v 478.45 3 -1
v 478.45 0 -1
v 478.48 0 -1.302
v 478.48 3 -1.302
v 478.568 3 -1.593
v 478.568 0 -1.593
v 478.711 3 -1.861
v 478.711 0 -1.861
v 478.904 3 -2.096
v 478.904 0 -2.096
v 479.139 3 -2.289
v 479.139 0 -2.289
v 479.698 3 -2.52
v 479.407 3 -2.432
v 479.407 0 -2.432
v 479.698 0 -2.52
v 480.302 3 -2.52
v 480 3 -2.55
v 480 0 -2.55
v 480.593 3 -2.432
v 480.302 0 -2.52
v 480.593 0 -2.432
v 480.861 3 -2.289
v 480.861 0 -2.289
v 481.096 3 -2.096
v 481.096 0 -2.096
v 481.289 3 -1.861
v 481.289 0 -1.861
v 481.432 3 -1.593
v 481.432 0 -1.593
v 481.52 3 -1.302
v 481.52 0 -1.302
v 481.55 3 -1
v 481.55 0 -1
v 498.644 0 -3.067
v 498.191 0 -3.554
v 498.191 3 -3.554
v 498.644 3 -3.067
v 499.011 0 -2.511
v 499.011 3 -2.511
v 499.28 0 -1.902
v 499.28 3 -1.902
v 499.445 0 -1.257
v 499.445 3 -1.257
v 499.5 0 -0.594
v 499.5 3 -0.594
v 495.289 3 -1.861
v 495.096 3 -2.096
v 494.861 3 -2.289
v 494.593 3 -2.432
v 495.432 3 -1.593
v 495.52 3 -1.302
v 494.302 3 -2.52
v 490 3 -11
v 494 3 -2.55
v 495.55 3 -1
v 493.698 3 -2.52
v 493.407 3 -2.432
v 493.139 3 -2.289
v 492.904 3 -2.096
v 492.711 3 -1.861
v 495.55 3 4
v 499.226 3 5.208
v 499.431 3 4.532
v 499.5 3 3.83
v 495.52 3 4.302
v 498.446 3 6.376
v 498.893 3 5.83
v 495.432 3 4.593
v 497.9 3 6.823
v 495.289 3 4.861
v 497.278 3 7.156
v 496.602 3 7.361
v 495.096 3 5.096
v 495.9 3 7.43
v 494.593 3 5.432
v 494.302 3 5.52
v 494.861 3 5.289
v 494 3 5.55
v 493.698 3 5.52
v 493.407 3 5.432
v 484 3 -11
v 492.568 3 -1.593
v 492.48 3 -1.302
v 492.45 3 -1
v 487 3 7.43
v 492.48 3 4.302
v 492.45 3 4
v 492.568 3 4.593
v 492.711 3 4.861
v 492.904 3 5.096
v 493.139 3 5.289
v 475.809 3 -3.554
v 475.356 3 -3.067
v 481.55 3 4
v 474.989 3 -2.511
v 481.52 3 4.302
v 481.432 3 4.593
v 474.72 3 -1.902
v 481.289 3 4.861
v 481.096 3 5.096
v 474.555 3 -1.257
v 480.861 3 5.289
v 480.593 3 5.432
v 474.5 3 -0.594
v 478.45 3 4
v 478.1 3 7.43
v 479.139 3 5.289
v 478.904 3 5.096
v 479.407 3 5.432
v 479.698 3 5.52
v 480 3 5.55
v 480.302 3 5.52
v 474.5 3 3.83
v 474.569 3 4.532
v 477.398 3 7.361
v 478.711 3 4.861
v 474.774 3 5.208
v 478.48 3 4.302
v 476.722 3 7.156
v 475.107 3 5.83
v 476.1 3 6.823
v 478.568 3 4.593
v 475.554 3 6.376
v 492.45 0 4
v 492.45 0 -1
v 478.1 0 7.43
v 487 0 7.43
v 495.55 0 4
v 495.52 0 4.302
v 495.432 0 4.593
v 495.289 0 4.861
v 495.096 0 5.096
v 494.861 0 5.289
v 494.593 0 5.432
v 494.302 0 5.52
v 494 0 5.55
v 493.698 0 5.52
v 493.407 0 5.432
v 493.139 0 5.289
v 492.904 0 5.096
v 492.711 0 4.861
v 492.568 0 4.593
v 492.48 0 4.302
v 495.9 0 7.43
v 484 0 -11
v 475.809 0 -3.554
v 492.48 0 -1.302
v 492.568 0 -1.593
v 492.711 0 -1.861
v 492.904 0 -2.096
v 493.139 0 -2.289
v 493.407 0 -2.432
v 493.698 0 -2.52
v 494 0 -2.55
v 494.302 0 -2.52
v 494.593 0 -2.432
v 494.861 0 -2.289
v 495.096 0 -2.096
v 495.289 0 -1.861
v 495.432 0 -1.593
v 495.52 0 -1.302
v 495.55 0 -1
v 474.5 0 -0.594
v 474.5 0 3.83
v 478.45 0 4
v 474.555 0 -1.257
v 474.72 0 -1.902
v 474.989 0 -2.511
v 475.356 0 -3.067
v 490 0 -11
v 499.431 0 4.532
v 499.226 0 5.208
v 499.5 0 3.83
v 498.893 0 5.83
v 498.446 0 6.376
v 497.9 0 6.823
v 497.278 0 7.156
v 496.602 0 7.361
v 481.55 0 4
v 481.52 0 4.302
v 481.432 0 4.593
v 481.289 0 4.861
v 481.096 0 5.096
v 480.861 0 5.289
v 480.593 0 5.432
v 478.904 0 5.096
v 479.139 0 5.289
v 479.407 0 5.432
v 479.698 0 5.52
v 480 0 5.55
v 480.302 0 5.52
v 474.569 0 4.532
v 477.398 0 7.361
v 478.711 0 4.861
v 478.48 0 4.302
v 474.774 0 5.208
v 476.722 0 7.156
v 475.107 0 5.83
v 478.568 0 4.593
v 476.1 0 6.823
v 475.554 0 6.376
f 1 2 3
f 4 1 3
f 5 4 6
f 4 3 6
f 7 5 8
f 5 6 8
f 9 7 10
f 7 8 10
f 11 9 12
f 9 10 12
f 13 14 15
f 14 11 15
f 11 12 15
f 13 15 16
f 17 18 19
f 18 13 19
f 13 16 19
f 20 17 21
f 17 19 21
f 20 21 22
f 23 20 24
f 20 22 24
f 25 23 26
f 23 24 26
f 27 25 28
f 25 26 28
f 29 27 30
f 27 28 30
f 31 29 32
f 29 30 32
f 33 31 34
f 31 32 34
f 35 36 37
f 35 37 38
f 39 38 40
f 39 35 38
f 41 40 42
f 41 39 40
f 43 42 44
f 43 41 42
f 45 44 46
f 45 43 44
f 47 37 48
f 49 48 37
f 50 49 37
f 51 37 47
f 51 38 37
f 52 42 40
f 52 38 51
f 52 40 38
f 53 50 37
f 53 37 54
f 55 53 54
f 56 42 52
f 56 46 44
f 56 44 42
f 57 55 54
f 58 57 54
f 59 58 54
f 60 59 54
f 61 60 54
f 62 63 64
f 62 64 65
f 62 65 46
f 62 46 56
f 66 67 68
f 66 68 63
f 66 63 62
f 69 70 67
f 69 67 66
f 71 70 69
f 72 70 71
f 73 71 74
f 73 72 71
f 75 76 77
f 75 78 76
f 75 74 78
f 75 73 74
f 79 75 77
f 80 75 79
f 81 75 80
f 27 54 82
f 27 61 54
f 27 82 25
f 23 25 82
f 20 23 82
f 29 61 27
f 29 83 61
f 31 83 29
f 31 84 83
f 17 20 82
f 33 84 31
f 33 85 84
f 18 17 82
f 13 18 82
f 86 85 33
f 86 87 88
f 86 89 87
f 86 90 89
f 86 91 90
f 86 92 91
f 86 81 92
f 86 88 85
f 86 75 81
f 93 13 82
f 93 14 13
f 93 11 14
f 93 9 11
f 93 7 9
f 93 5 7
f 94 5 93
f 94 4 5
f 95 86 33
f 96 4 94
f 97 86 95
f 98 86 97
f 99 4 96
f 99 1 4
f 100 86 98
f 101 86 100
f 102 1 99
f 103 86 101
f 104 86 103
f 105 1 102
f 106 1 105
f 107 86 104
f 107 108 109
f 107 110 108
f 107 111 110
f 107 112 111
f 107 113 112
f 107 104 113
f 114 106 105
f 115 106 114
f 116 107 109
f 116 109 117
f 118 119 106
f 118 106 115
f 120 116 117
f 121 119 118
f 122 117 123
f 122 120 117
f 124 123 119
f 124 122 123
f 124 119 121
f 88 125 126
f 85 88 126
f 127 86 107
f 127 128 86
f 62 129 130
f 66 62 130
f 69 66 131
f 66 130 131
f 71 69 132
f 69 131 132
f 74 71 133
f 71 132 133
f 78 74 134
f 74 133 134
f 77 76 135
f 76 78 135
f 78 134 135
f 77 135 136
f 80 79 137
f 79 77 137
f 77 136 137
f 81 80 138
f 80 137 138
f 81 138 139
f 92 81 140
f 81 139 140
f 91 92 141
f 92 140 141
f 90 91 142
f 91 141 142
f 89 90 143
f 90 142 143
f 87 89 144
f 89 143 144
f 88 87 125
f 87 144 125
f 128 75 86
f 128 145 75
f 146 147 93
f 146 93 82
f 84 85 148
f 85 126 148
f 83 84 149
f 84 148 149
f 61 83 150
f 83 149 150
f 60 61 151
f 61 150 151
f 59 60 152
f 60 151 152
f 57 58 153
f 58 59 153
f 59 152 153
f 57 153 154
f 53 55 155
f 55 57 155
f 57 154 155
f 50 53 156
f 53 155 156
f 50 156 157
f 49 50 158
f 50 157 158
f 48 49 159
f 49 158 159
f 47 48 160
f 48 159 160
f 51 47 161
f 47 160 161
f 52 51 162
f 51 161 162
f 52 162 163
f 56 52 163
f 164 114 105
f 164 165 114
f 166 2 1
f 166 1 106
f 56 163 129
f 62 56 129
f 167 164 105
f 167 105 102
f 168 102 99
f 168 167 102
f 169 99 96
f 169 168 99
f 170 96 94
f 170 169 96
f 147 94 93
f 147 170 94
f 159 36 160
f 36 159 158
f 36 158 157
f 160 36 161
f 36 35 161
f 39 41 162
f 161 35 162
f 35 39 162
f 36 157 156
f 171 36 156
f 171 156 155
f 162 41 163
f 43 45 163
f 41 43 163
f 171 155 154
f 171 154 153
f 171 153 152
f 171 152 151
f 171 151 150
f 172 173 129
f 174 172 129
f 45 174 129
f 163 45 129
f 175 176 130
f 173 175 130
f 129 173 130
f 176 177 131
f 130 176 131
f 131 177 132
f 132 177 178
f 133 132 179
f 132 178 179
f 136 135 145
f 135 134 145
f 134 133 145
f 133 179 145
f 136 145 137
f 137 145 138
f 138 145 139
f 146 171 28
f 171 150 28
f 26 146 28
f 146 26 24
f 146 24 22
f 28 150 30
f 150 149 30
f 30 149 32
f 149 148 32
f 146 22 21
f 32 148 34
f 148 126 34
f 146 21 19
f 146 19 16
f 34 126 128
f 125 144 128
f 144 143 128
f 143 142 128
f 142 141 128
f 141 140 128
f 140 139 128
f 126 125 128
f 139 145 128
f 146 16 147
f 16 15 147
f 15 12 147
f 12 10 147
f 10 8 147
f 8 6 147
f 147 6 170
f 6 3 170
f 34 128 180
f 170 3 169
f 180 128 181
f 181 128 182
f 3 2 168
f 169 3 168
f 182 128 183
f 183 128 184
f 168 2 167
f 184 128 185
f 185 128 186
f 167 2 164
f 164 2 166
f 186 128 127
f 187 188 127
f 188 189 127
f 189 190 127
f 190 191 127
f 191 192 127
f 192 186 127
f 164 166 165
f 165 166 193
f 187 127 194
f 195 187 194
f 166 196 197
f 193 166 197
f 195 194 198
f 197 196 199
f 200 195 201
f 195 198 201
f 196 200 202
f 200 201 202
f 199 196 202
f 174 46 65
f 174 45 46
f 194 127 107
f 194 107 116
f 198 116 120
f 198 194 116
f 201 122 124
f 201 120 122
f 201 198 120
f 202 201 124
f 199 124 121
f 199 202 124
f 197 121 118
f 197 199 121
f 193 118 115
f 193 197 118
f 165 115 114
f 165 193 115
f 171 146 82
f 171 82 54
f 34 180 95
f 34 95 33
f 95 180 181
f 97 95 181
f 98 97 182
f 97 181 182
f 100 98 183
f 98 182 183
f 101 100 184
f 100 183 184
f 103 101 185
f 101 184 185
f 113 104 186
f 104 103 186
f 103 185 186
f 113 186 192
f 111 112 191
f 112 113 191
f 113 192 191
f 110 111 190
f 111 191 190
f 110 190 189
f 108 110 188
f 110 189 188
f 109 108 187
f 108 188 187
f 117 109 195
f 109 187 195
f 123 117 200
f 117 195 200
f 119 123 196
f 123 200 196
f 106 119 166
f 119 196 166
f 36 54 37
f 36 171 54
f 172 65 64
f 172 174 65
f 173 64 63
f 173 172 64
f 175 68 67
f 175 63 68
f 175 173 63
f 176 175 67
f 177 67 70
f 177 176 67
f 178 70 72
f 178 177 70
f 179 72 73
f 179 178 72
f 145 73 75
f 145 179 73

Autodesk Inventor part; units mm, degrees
ref_plane "YZ Plane" through (0, 0, 0) normal (1, 0, 0) x (0, 1, 0)
ref_plane "XZ Plane" through (0, 0, 0) normal (0, 1, 0) x (-1, 0, 0)
ref_plane "XY Plane" through (0, 0, 0) normal (0, 0, 1) x (1, 0, 0)
sketch3d "3D Sketch1"
sketch "Sketch8" plane through (0, 0, 0) normal (0, 1, 0) x (-1, 0, 0)
  arc A0 (-533.9727, 129.2939) -> (-533.9727, 72.7061) centre (-524, 101) ccw projected
  arc A1 (-533.9727, 129.2939) -> (-540.6211, 148.1565) centre (-537.2969, 138.7252) ccw projected
  arc A2 (-540.6211, 148.1565) -> (-540.6211, 53.8435) centre (-524, 101) ccw projected
  arc A3 (-540.6211, 53.8435) -> (-533.9727, 72.7061) centre (-537.2969, 63.2748) ccw projected
  circle A4 centre (-537.2969, 63.2748) radius 3 projected
  circle A5 centre (-556.6482, 77.8001) radius 2.9994 projected
  circle A6 centre (-564, 101) radius 3 projected
  circle A7 centre (-556.6482, 124.1094) radius 2.9994 projected
  circle A8 centre (-537.2969, 138.7252) radius 3 projected
  line L0 (-531, 98.5) -> (-531, 115.5) projected
  line L1 (-451.3425, 101.8066) -> (-466.8633, 88.0104) projected
  arc A9 (-451.3425, 101.8066) -> (-450, 104.7963) centre (-454, 104.7963) ccw projected
  line L2 (-450, 109.2037) -> (-450, 104.7963) projected
  arc A10 (-450, 109.2037) -> (-451.3425, 112.1934) centre (-454, 109.2037) ccw projected
  line L3 (-466.8633, 125.9896) -> (-451.3425, 112.1934) projected
  arc A11 (-466.8633, 125.9896) -> (-469.5208, 127) centre (-469.5208, 123) ccw projected
  line L4 (-505.0775, 127) -> (-469.5208, 127) projected
  arc A12 (-505.0775, 127) -> (-508.201, 125.4988) centre (-505.0775, 123) ccw projected
  line L5 (-511.799, 121.0012) -> (-508.201, 125.4988) projected
  arc A13 (-514.9225, 119.5) -> (-511.799, 121.0012) centre (-514.9225, 123.5) ccw projected
  line L6 (-527, 119.5) -> (-514.9225, 119.5) projected
  arc A14 (-527, 119.5) -> (-531, 115.5) centre (-527, 115.5) ccw projected
  arc A15 (-531, 98.5) -> (-527, 94.5) centre (-527, 98.5) ccw projected
  line L7 (-514.9225, 94.5) -> (-527, 94.5) projected
  arc A16 (-511.799, 92.9988) -> (-514.9225, 94.5) centre (-514.9225, 90.5) ccw projected
  line L8 (-508.201, 88.5012) -> (-511.799, 92.9988) projected
  arc A17 (-508.201, 88.5012) -> (-505.0775, 87) centre (-505.0775, 91) ccw projected
  line L9 (-469.5208, 87) -> (-505.0775, 87) projected
  line L10 (-478, 91.45) -> (-470, 91.45) projected
  arc A18 (-470, 91.45) -> (-470, 94.55) centre (-470, 93) ccw projected
  line L11 (-470, 94.55) -> (-478, 94.55) projected
  arc A19 (-478, 94.55) -> (-478, 91.45) centre (-478, 93) ccw projected
  arc A20 (-495, 91.45) -> (-495, 94.55) centre (-495, 93) ccw projected
  line L12 (-503, 91.45) -> (-495, 91.45) projected
  arc A21 (-503, 94.55) -> (-503, 91.45) centre (-503, 93) ccw projected
  line L13 (-495, 94.55) -> (-503, 94.55) projected
  line L14 (-455, 105.5) -> (-469, 105.5) projected
  arc A22 (-455, 105.5) -> (-455, 108.5) centre (-455, 107) ccw projected
  line L15 (-469, 108.5) -> (-455, 108.5) projected
  arc A23 (-469, 108.5) -> (-469, 105.5) centre (-469, 107) ccw projected
  arc A24 (-482, 105.45) -> (-482, 108.55) centre (-482, 107) ccw projected
  line L16 (-490, 105.45) -> (-482, 105.45) projected
  arc A25 (-490, 108.55) -> (-490, 105.45) centre (-490, 107) ccw projected
  line L17 (-482, 108.55) -> (-490, 108.55) projected
  line L18 (-501, 109) -> (-501, 105) projected
  line L19 (-501, 105) -> (-511, 105) projected
  line L20 (-511, 105) -> (-511, 109) projected
  line L21 (-511, 109) -> (-501, 109) projected
  circle A26 centre (-525.75, 100) radius 1.55 projected
  circle A27 centre (-525.75, 114) radius 1.55 projected
  arc A28 (-503, 122.55) -> (-503, 119.45) centre (-503, 121) ccw projected
  line L22 (-503, 122.55) -> (-495, 122.55) projected
  arc A29 (-495, 119.45) -> (-495, 122.55) centre (-495, 121) ccw projected
  line L23 (-495, 119.45) -> (-503, 119.45) projected
  arc A30 (-478, 122.55) -> (-478, 119.45) centre (-478, 121) ccw projected
  line L24 (-478, 122.55) -> (-470, 122.55) projected
  arc A31 (-470, 119.45) -> (-470, 122.55) centre (-470, 121) ccw projected
  line L25 (-470, 119.45) -> (-478, 119.45) projected
  arc A32 (-469.5208, 87) -> (-466.8633, 88.0104) centre (-469.5208, 91) ccw projected
  line L26 (-487, 7.43) -> (-478.1, 7.43) projected
  line L27 (-495.9, 7.43) -> (-487, 7.43) projected
  arc A33 (-495.9, 7.43) -> (-499.5, 3.83) centre (-495.9, 3.83) ccw projected
  line L28 (-499.5, -0.5942) -> (-499.5, 3.83) projected
  arc A34 (-499.5, -0.5942) -> (-498.1907, -3.5539) centre (-495.5, -0.5942) ccw projected
  line L29 (-490, -11) -> (-498.1907, -3.5539) projected
  line L30 (-484, -11) -> (-490, -11) projected
  line L31 (-475.8093, -3.5539) -> (-484, -11) projected
  arc A35 (-475.8093, -3.5539) -> (-474.5, -0.5942) centre (-478.5, -0.5942) ccw projected
  line L32 (-474.5, 3.83) -> (-474.5, -0.5942) projected
  arc A36 (-474.5, 3.83) -> (-478.1, 7.43) centre (-478.1, 3.83) ccw projected
  arc A37 (-478.45, 4) -> (-481.55, 4) centre (-480, 4) ccw projected
  line L33 (-481.55, 4) -> (-481.55, -1) projected
  arc A38 (-481.55, -1) -> (-478.45, -1) centre (-480, -1) ccw projected
  line L34 (-478.45, -1) -> (-478.45, 4) projected
  line L35 (-492.45, 4) -> (-492.45, -1) projected
  arc A39 (-492.45, 4) -> (-495.55, 4) centre (-494, 4) ccw projected
  line L36 (-495.55, -1) -> (-495.55, 4) projected
  arc A40 (-495.55, -1) -> (-492.45, -1) centre (-494, -1) ccw projected
  arc A41 (-494.09, 79.2321) -> (-479.91, 79.2321) centre (-487, 84) ccw projected
  arc A42 (-494.09, 79.2321) -> (-497.4092, 81) centre (-497.4092, 77) ccw projected
  line L37 (-497.4092, 81) -> (-503, 81) projected
  arc A43 (-503, 81) -> (-507, 77) centre (-503, 77) ccw projected
  line L38 (-507, 77) -> (-507, 50.7937) projected
  arc A44 (-511.1379, 43.7877) -> (-507, 50.7937) centre (-515, 50.7937) ccw projected
  arc A45 (-511.1379, 43.7877) -> (-462.8621, 43.7877) centre (-487, 0) ccw projected
  arc A46 (-467, 50.7937) -> (-462.8621, 43.7877) centre (-459, 50.7937) ccw projected
  line L39 (-467, 50.7937) -> (-467, 77) projected
  arc A47 (-467, 77) -> (-471, 81) centre (-471, 77) ccw projected
  line L40 (-471, 81) -> (-476.5908, 81) projected
  arc A48 (-476.5908, 81) -> (-479.91, 79.2321) centre (-476.5908, 77) ccw projected
  circle A49 centre (-473, 75) radius 1.25 projected
  circle A50 centre (-501, 75) radius 1.25 projected
  circle A51 centre (-487, 63) radius 1.25 projected
  circle A52 centre (-470.7, 62.6926) radius 1.25 projected
  circle A53 centre (-473, 50) radius 1.25 projected
  circle A54 centre (-501, 50) radius 1.25 projected
  circle A55 centre (-470.7, 37.4926) radius 1.25 projected
  arc A56 (-485, 53) -> (-489, 53) centre (-487, 53) ccw projected
  line L41 (-485, 37) -> (-485, 53) projected
  line L42 (-489, 53) -> (-489, 37) projected
  arc A57 (-489, 37) -> (-485, 37) centre (-487, 37) ccw projected
  arc A58 (-513.2873, 34.029) -> (-460.7127, 34.0291) centre (-487, 0) ccw projected
  arc A59 (-509.6193, 29.2808) -> (-464.3807, 29.2808) centre (-487, 0) ccw projected
  arc A60 (-460.7127, 34.0291) -> (-464.3807, 29.2808) centre (-462.5467, 31.6549) ccw projected
  arc A61 (-509.6193, 29.2808) -> (-513.2873, 34.029) centre (-511.4533, 31.6549) ccw projected
  arc A62 (-496, 32) -> (-500, 28) centre (-496, 28) ccw projected
  line L43 (-496, 32) -> (-478, 32) projected
  arc A63 (-474, 28) -> (-478, 32) centre (-478, 28) ccw projected
  line L44 (-474, 28) -> (-474, 22) projected
  arc A64 (-474, 22) -> (-470, 18) centre (-470, 22) ccw projected
  line L45 (-470, 18) -> (-465.0911, 18) projected
  arc A65 (-461.7205, 16.1538) -> (-465.0911, 18) centre (-465.0911, 14) ccw projected
  arc A66 (-512.2795, 16.1538) -> (-461.7205, 16.1538) centre (-487, 0) ccw projected
  arc A67 (-508.9089, 18) -> (-512.2795, 16.1538) centre (-508.9089, 14) ccw projected
  line L46 (-508.9089, 18) -> (-504, 18) projected
  arc A68 (-504, 18) -> (-500, 22) centre (-504, 22) ccw projected
  line L47 (-500, 22) -> (-500, 28) projected
  point P0 (0, 0)
extrude "Extrusion1" add sketch "Sketch8" along normal blind 3 contours L26 A36 L32 A35 L31 L30 L29 A34 L28 A33 L27
properties part number "pulsador_punta"
